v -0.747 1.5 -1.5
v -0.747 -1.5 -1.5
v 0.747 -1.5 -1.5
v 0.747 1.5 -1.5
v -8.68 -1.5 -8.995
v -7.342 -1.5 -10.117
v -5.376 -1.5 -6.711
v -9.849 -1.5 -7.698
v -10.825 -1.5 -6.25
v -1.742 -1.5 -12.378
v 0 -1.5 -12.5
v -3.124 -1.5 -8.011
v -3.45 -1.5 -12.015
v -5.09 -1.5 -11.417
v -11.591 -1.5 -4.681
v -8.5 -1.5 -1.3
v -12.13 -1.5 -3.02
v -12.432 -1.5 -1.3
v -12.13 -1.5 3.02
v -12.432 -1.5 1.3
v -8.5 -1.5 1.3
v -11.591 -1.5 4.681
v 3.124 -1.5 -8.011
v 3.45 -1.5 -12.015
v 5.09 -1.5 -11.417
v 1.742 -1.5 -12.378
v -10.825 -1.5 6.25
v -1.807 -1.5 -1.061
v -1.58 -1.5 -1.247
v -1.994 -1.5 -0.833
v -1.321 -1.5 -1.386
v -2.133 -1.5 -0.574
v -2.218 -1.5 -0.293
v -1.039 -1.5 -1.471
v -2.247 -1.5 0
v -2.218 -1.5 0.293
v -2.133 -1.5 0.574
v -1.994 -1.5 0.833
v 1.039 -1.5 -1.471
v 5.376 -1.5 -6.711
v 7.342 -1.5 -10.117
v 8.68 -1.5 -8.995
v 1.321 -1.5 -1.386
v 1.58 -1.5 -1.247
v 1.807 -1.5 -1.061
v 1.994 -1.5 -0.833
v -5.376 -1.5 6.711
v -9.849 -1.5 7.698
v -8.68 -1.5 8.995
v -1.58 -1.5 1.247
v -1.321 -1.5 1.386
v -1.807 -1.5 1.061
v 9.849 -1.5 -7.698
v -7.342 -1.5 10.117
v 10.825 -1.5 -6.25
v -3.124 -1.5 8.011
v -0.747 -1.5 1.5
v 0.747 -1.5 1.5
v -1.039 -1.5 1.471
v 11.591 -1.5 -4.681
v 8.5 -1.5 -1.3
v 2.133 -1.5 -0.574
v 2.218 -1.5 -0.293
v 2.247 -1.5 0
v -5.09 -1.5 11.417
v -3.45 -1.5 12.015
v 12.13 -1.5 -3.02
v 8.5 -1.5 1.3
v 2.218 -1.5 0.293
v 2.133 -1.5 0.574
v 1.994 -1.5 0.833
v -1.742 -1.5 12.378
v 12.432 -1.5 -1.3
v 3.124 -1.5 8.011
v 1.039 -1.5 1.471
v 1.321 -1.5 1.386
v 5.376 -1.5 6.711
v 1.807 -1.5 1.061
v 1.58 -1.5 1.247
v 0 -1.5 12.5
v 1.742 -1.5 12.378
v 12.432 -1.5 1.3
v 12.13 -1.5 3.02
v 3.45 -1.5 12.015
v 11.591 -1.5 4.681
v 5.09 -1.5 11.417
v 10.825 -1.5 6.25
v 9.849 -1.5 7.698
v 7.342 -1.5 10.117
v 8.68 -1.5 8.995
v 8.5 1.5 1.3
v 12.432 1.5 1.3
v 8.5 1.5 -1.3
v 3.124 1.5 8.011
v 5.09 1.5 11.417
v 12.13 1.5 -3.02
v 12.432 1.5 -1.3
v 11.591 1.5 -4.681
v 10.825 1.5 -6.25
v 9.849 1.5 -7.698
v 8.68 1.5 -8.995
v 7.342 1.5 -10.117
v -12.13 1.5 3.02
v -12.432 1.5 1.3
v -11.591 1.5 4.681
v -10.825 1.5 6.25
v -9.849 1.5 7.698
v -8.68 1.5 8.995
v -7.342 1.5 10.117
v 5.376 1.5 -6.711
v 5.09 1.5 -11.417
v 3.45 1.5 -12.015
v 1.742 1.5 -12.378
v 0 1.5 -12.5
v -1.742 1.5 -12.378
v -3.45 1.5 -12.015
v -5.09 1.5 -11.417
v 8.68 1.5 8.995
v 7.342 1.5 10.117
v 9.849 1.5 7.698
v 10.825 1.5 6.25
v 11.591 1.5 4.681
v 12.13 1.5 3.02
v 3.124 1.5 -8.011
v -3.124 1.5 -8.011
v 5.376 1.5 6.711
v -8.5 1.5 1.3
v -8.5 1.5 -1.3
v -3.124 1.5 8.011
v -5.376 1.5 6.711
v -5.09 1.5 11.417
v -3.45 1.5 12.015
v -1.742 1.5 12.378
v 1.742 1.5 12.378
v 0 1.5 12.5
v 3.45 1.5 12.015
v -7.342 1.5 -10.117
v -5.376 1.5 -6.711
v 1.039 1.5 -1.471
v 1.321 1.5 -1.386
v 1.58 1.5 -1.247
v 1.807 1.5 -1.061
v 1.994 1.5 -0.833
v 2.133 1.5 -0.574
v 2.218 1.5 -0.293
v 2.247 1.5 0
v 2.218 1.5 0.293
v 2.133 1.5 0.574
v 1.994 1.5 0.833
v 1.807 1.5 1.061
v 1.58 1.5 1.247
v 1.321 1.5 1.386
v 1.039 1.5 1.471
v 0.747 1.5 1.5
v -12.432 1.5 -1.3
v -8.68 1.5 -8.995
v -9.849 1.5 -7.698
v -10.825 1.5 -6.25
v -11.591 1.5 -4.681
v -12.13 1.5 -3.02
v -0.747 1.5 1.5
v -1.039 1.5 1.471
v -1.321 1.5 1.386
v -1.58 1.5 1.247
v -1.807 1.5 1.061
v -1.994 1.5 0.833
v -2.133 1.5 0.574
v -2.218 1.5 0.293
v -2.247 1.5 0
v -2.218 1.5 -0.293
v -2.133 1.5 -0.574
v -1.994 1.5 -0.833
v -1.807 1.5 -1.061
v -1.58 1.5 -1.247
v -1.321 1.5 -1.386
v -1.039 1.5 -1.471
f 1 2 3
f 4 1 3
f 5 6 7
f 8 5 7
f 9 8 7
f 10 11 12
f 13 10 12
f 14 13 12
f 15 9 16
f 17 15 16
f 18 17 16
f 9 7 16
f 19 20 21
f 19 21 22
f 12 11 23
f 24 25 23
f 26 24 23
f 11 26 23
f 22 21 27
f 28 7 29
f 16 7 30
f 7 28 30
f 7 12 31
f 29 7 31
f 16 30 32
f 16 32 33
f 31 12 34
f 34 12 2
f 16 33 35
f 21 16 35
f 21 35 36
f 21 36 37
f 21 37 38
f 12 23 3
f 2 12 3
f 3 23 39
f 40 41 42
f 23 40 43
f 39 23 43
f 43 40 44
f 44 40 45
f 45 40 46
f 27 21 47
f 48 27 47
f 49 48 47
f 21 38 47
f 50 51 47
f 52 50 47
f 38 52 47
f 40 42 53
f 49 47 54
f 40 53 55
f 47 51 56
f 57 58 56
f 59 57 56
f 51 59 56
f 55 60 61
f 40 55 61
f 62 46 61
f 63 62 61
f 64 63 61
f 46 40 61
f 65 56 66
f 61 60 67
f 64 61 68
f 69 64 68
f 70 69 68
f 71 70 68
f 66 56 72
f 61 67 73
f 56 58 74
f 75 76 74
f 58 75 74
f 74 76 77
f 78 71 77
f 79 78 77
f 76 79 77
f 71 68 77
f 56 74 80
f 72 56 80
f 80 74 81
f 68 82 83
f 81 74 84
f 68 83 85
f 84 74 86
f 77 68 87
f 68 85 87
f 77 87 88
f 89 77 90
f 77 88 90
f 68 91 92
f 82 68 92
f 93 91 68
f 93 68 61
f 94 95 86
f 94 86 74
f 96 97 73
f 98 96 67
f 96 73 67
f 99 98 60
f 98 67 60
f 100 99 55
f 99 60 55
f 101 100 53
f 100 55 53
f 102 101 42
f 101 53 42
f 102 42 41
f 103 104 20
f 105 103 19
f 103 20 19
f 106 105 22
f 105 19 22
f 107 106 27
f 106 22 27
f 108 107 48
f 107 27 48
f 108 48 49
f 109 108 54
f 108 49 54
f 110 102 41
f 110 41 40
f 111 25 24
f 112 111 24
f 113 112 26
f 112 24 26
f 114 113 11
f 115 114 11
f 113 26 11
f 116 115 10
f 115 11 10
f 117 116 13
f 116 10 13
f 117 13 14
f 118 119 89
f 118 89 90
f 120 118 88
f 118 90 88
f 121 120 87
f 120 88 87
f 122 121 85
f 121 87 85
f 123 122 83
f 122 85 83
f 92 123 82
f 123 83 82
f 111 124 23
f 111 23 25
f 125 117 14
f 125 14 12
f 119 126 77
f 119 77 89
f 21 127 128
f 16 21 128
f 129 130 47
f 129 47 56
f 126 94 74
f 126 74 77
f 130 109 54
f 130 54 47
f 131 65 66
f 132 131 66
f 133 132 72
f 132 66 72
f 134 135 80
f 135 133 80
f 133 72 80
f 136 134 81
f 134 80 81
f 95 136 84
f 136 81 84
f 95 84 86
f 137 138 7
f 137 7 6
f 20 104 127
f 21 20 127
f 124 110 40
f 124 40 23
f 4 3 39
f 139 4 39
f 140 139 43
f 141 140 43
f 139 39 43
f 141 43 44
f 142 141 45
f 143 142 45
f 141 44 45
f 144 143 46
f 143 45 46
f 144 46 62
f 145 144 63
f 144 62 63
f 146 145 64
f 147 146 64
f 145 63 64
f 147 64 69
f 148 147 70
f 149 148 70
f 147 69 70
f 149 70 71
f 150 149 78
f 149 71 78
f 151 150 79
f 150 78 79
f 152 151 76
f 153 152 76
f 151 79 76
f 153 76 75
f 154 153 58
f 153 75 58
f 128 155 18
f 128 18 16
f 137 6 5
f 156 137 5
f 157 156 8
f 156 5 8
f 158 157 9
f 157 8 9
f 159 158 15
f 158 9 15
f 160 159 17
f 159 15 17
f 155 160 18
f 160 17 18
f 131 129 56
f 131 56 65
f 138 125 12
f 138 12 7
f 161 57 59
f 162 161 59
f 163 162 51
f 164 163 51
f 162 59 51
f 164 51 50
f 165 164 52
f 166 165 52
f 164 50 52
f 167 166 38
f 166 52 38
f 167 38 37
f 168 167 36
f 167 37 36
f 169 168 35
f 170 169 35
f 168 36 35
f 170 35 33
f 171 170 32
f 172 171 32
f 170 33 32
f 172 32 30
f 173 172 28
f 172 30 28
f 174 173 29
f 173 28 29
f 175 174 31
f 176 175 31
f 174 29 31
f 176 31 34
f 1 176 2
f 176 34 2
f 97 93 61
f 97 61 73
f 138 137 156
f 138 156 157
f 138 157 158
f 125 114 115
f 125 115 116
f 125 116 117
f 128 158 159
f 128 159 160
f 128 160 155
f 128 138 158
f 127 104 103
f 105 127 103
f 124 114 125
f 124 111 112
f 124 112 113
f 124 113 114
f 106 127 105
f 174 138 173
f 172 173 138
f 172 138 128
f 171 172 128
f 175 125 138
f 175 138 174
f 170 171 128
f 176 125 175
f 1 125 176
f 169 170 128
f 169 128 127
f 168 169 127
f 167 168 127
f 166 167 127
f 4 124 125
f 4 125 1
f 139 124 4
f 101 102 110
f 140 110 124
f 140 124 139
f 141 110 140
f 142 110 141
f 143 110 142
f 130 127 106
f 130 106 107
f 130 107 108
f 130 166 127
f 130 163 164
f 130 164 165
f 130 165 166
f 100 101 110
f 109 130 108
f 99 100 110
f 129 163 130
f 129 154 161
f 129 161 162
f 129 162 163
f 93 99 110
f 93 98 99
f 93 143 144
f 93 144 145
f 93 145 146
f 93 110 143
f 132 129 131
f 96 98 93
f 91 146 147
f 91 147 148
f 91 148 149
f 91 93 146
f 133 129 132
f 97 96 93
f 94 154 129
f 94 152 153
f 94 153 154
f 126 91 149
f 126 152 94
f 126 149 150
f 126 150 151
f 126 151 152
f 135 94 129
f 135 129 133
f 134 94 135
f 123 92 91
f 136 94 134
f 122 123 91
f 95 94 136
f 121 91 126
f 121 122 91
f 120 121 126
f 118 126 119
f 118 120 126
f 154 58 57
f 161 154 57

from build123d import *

# Parameters (mm, degrees)
BOSS_EXTRUDE1_DEPTH      = 1.5
BOSS_EXTRUDE1_DEPTH_BACK = 1.5
SKETCH1_R                = 12.5
SKETCH2_W                = 8
SKETCH2_H                = 2.6
CUT_EXTRUDE1_DEPTH       = 18.930421077
CUT_EXTRUDE2_DEPTH       = 18.693501632
CUT_EXTRUDE2_DEPTH_BACK  = 18.693501632


with BuildPart() as part:
    # Sketch1 → Boss-Extrude1 (new, two sides: drawn at the far end of the back side and taken through both)
    with BuildSketch(Plane(origin=(0, 0, 0), x_dir=(1, 0, 0), z_dir=(0, 1, 0)).offset(-BOSS_EXTRUDE1_DEPTH_BACK)):
        Circle(SKETCH1_R)
    extrude(amount=BOSS_EXTRUDE1_DEPTH + BOSS_EXTRUDE1_DEPTH_BACK)

    # Sketch2 → Cut-Extrude1 (cut, through all)
    with BuildSketch(Plane(origin=(0, 1.5, 0), x_dir=(1, 0, 0), z_dir=(0, 1, 0))):
        Polygon((9.375833025, 13.639419162), (5.375833025, 6.711215932), (3.124166975, 8.011215932), (7.124166975, 14.939419162), align=None)
        with Locations((12.5, 0)):
            Rectangle(SKETCH2_W, SKETCH2_H)
        Polygon((-7.124166975, 14.939419162), (-3.124166975, 8.011215932), (-5.375833025, 6.711215932), (-9.375833025, 13.639419162), align=None)
        with Locations((-12.5, 0)):
            Rectangle(SKETCH2_W, SKETCH2_H)
        Polygon((-9.375833025, -13.639419162), (-5.375833025, -6.711215932), (-3.124166975, -8.011215932), (-7.124166975, -14.939419162), align=None)
        Polygon((7.124166975, -14.939419162), (3.124166975, -8.011215932), (5.375833025, -6.711215932), (9.375833025, -13.639419162), align=None)
    extrude(amount=-CUT_EXTRUDE1_DEPTH, mode=Mode.SUBTRACT)

    # Sketch3 → Cut-Extrude2 (cut, two sides: drawn at the far end of the back side and taken through both)
    with BuildSketch(Plane(origin=(0, 0, 0), x_dir=(1, 0, 0), z_dir=(0, 1, 0)).offset(-CUT_EXTRUDE2_DEPTH_BACK)):
        with BuildLine():
            Line((-0.746821454, 1.5), (0.746821454, 1.5))
            ThreePointArc((0.746821454, 1.5), (2.246821454, 0), (0.746821454, -1.5))
            Line((0.746821454, -1.5), (-0.746821454, -1.5))
            ThreePointArc((-0.746821454, -1.5), (-2.246821454, 0), (-0.746821454, 1.5))
        make_face()
    extrude(amount=CUT_EXTRUDE2_DEPTH + CUT_EXTRUDE2_DEPTH_BACK, mode=Mode.SUBTRACT)


solid = part.part
